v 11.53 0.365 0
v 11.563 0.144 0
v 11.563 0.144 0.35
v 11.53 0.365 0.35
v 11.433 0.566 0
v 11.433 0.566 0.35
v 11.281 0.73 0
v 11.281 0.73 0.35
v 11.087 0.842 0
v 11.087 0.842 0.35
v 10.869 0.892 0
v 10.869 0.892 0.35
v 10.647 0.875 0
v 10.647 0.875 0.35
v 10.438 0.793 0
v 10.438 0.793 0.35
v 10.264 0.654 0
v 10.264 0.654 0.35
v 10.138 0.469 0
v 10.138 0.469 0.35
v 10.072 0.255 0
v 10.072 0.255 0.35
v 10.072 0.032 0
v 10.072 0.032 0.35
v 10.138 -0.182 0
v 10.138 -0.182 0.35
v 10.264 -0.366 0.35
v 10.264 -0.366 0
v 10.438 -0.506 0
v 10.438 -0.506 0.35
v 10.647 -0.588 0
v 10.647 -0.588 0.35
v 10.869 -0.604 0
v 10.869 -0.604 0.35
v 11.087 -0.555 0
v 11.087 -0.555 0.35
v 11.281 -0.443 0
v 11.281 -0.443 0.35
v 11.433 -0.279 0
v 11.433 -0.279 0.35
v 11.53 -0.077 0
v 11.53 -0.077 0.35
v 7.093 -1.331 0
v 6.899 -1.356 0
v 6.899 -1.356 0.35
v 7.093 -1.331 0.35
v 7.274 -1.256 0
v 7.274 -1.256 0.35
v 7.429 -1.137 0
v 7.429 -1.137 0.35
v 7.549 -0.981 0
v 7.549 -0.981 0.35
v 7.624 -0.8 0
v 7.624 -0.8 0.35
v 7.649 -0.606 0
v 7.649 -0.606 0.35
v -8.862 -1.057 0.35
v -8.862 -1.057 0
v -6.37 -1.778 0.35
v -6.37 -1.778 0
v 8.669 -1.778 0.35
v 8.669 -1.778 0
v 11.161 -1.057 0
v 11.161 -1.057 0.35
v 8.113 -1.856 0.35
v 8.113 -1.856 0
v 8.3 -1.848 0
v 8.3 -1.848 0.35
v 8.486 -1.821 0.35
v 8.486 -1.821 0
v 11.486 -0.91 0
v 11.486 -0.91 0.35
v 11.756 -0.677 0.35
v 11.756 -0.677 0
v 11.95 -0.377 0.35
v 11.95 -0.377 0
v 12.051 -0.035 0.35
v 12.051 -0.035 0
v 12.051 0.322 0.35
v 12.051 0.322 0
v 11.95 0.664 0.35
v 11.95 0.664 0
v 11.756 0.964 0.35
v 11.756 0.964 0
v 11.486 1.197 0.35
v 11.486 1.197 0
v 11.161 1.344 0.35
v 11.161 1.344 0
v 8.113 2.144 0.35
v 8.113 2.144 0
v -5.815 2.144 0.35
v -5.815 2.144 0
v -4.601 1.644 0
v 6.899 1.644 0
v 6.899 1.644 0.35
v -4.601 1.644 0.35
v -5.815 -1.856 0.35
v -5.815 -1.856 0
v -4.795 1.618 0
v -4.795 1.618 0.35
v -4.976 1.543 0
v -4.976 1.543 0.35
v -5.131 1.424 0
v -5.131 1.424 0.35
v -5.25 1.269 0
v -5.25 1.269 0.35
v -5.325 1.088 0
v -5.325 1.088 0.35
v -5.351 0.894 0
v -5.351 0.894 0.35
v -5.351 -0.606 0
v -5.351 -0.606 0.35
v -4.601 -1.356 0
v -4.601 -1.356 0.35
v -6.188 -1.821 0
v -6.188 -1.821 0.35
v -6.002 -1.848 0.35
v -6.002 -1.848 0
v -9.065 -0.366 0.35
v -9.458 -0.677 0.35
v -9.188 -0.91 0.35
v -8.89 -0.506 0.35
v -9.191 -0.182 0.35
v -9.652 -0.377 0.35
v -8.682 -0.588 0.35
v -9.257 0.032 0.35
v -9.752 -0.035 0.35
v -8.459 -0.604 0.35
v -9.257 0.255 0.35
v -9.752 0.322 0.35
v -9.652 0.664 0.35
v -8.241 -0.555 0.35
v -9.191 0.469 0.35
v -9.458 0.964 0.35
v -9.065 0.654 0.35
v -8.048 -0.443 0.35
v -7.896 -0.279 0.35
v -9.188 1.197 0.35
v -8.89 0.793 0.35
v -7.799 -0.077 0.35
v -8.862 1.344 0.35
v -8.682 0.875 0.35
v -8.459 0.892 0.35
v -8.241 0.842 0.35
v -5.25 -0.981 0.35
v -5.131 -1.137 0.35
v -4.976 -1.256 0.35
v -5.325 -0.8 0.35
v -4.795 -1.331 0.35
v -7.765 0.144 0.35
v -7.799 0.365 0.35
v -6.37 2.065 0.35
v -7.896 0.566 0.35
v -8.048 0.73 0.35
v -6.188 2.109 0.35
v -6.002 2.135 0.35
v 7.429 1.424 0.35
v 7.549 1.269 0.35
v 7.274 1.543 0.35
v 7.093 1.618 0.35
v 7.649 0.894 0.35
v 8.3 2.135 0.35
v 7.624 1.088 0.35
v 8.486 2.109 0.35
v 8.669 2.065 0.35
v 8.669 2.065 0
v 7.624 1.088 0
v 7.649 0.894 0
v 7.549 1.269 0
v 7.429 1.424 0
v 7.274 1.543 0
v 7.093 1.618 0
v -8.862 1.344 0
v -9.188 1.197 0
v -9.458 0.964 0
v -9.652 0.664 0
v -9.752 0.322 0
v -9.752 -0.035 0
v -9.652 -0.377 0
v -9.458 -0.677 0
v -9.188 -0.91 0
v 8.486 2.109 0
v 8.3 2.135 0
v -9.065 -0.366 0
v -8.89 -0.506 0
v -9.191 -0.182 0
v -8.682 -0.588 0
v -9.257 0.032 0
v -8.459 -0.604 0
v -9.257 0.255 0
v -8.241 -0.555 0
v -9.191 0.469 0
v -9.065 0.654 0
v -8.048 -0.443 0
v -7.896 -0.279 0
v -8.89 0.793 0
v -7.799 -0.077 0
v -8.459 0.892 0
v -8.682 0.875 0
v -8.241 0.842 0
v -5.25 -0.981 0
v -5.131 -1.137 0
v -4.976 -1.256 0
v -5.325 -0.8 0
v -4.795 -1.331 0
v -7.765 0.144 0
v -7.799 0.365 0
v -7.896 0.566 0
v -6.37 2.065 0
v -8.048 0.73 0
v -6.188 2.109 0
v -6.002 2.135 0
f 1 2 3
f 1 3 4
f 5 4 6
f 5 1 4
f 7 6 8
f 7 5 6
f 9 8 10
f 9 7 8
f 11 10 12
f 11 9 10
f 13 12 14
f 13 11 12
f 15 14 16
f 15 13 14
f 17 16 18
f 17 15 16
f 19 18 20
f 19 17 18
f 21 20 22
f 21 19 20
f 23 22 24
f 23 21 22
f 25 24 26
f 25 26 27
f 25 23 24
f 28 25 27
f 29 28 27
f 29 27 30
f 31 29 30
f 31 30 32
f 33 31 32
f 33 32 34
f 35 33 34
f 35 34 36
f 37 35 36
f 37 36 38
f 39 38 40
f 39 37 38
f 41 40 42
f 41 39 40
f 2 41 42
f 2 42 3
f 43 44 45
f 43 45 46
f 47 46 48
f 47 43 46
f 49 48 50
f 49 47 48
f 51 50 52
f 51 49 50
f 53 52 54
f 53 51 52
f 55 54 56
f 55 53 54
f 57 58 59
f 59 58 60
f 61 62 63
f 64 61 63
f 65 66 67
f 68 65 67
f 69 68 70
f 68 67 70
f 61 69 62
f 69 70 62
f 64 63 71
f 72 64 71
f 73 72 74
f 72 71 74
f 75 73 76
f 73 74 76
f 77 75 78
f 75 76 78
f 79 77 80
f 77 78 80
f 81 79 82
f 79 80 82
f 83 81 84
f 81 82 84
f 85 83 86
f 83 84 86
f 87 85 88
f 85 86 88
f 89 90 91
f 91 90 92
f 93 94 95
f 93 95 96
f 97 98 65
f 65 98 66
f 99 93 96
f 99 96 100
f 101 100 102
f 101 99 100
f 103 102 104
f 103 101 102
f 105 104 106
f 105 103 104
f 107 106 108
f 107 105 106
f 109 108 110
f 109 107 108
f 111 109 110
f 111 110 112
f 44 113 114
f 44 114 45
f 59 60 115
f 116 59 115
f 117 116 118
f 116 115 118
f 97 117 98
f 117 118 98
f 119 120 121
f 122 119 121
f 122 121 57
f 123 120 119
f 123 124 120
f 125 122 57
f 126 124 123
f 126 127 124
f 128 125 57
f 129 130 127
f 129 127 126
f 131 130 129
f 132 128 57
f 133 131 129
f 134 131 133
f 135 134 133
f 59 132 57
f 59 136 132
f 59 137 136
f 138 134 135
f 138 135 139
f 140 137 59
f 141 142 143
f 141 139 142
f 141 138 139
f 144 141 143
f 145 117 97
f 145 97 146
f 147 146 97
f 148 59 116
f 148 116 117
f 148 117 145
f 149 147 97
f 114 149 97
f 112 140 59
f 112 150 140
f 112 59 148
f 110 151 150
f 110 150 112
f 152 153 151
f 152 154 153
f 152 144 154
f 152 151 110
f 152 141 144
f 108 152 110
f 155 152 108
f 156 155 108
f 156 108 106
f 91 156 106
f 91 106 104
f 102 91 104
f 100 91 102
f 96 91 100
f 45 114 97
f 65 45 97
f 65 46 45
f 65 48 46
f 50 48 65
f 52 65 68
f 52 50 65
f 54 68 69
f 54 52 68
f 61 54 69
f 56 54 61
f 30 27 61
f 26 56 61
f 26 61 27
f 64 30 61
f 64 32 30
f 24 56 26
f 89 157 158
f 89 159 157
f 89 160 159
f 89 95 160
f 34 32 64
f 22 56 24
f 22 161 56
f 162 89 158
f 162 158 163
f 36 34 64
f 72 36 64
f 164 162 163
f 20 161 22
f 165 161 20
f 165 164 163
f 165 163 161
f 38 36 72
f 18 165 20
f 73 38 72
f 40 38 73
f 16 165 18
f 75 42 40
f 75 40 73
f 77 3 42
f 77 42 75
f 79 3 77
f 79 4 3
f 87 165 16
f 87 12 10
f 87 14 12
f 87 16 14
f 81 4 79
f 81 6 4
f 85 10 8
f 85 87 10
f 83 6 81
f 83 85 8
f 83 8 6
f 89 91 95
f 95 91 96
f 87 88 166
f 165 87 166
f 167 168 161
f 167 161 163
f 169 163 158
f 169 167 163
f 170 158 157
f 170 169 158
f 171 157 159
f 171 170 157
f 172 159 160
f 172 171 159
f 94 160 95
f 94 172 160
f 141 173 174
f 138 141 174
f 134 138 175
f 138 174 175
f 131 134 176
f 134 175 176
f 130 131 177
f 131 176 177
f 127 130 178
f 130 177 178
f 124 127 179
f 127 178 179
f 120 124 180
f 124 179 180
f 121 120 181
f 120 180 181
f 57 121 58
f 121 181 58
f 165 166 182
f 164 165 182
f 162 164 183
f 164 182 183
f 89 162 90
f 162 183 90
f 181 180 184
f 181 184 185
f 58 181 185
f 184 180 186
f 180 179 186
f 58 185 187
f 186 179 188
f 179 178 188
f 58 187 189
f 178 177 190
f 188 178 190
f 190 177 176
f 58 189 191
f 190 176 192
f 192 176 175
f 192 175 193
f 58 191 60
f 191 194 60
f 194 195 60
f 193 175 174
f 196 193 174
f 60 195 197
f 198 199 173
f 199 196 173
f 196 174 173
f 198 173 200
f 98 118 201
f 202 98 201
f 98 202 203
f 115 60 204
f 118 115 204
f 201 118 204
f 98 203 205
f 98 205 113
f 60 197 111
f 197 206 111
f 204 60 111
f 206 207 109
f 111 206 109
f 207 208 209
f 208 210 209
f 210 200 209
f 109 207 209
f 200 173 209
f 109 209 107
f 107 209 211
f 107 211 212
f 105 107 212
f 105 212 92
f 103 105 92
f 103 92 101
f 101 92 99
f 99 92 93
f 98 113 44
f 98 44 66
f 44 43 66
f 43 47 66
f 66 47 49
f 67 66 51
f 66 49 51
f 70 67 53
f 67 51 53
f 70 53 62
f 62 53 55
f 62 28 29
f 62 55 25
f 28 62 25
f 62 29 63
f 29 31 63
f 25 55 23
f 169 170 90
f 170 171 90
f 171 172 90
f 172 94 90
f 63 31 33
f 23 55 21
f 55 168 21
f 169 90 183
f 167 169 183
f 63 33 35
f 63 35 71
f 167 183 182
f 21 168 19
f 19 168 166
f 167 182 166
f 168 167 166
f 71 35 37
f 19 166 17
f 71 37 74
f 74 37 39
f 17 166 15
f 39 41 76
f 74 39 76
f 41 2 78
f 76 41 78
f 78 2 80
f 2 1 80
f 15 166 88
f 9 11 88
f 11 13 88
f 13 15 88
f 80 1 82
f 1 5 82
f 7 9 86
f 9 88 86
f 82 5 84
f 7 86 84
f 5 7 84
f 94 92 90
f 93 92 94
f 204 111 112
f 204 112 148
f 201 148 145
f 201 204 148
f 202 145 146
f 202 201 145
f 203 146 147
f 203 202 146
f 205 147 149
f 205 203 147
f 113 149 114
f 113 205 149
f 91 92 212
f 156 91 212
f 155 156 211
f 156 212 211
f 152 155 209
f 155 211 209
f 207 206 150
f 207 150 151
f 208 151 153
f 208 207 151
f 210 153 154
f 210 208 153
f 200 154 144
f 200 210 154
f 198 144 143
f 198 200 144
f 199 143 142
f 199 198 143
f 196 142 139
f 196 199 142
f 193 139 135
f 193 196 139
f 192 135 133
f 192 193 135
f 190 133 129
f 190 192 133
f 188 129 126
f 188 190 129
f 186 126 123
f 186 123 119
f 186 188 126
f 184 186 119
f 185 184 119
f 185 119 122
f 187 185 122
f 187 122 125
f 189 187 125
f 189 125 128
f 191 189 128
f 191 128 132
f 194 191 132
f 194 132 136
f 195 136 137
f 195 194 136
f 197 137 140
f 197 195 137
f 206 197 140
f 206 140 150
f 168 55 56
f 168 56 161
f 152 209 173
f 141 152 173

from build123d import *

# Parameters (mm, degrees)
SKETCH1_R           = 0.75
BOSS_EXTRUDE1_DEPTH = 0.35


with BuildPart() as part:
    # Sketch1 → Boss-Extrude1 (new body)
    with BuildSketch(Plane.XY):
        with BuildLine():
            Line((-5.814833275, -1.856361479), (8.113049614, -1.856361479))
            ThreePointArc((8.113049614, -1.856361479), (8.393561593, -1.836592028), (8.668528006, -1.777674508))
            Line((8.668528006, -1.777674508), (11.160598675, -1.057182122))
            ThreePointArc((11.160598675, -1.057182122), (12.06342468, 0.143638521), (11.160598675, 1.344459164))
            Line((11.160598675, 1.344459164), (8.668528006, 2.06495155))
            ThreePointArc((8.668528006, 2.06495155), (8.393561593, 2.123869071), (8.113049614, 2.143638521))
            Line((8.113049614, 2.143638521), (-5.814833275, 2.143638521))
            ThreePointArc((-5.814833275, 2.143638521), (-6.095345255, 2.123869071), (-6.370311667, 2.06495155))
            Line((-6.370311667, 2.06495155), (-8.862382336, 1.344459164))
            ThreePointArc((-8.862382336, 1.344459164), (-9.765208341, 0.143638521), (-8.862382336, -1.057182122))
            Line((-8.862382336, -1.057182122), (-6.370311667, -1.777674508))
            ThreePointArc((-6.370311667, -1.777674508), (-6.095345255, -1.836592028), (-5.814833275, -1.856361479))
        make_face()
        with Locations((-8.515208341, 0.143638521)):
            Circle(SKETCH1_R, mode=Mode.SUBTRACT)
        with Locations((10.81342468, 0.143638521)):
            Circle(SKETCH1_R, mode=Mode.SUBTRACT)
        with BuildLine():
            Line((7.649108169, -0.606361479), (7.649108169, 0.893638521))
            ThreePointArc((7.649108169, 0.893638521), (7.429438255, 1.423968607), (6.899108169, 1.643638521))
            Line((6.899108169, 1.643638521), (-4.600891831, 1.643638521))
            ThreePointArc((-4.600891831, 1.643638521), (-5.131221917, 1.423968607), (-5.350891831, 0.893638521))
            Line((-5.350891831, 0.893638521), (-5.350891831, -0.606361479))
            ThreePointArc((-5.350891831, -0.606361479), (-5.131221917, -1.136691565), (-4.600891831, -1.356361479))
            Line((-4.600891831, -1.356361479), (6.899108169, -1.356361479))
            ThreePointArc((6.899108169, -1.356361479), (7.429438255, -1.136691565), (7.649108169, -0.606361479))
        make_face(mode=Mode.SUBTRACT)
    extrude(amount=BOSS_EXTRUDE1_DEPTH)


solid = part.part
